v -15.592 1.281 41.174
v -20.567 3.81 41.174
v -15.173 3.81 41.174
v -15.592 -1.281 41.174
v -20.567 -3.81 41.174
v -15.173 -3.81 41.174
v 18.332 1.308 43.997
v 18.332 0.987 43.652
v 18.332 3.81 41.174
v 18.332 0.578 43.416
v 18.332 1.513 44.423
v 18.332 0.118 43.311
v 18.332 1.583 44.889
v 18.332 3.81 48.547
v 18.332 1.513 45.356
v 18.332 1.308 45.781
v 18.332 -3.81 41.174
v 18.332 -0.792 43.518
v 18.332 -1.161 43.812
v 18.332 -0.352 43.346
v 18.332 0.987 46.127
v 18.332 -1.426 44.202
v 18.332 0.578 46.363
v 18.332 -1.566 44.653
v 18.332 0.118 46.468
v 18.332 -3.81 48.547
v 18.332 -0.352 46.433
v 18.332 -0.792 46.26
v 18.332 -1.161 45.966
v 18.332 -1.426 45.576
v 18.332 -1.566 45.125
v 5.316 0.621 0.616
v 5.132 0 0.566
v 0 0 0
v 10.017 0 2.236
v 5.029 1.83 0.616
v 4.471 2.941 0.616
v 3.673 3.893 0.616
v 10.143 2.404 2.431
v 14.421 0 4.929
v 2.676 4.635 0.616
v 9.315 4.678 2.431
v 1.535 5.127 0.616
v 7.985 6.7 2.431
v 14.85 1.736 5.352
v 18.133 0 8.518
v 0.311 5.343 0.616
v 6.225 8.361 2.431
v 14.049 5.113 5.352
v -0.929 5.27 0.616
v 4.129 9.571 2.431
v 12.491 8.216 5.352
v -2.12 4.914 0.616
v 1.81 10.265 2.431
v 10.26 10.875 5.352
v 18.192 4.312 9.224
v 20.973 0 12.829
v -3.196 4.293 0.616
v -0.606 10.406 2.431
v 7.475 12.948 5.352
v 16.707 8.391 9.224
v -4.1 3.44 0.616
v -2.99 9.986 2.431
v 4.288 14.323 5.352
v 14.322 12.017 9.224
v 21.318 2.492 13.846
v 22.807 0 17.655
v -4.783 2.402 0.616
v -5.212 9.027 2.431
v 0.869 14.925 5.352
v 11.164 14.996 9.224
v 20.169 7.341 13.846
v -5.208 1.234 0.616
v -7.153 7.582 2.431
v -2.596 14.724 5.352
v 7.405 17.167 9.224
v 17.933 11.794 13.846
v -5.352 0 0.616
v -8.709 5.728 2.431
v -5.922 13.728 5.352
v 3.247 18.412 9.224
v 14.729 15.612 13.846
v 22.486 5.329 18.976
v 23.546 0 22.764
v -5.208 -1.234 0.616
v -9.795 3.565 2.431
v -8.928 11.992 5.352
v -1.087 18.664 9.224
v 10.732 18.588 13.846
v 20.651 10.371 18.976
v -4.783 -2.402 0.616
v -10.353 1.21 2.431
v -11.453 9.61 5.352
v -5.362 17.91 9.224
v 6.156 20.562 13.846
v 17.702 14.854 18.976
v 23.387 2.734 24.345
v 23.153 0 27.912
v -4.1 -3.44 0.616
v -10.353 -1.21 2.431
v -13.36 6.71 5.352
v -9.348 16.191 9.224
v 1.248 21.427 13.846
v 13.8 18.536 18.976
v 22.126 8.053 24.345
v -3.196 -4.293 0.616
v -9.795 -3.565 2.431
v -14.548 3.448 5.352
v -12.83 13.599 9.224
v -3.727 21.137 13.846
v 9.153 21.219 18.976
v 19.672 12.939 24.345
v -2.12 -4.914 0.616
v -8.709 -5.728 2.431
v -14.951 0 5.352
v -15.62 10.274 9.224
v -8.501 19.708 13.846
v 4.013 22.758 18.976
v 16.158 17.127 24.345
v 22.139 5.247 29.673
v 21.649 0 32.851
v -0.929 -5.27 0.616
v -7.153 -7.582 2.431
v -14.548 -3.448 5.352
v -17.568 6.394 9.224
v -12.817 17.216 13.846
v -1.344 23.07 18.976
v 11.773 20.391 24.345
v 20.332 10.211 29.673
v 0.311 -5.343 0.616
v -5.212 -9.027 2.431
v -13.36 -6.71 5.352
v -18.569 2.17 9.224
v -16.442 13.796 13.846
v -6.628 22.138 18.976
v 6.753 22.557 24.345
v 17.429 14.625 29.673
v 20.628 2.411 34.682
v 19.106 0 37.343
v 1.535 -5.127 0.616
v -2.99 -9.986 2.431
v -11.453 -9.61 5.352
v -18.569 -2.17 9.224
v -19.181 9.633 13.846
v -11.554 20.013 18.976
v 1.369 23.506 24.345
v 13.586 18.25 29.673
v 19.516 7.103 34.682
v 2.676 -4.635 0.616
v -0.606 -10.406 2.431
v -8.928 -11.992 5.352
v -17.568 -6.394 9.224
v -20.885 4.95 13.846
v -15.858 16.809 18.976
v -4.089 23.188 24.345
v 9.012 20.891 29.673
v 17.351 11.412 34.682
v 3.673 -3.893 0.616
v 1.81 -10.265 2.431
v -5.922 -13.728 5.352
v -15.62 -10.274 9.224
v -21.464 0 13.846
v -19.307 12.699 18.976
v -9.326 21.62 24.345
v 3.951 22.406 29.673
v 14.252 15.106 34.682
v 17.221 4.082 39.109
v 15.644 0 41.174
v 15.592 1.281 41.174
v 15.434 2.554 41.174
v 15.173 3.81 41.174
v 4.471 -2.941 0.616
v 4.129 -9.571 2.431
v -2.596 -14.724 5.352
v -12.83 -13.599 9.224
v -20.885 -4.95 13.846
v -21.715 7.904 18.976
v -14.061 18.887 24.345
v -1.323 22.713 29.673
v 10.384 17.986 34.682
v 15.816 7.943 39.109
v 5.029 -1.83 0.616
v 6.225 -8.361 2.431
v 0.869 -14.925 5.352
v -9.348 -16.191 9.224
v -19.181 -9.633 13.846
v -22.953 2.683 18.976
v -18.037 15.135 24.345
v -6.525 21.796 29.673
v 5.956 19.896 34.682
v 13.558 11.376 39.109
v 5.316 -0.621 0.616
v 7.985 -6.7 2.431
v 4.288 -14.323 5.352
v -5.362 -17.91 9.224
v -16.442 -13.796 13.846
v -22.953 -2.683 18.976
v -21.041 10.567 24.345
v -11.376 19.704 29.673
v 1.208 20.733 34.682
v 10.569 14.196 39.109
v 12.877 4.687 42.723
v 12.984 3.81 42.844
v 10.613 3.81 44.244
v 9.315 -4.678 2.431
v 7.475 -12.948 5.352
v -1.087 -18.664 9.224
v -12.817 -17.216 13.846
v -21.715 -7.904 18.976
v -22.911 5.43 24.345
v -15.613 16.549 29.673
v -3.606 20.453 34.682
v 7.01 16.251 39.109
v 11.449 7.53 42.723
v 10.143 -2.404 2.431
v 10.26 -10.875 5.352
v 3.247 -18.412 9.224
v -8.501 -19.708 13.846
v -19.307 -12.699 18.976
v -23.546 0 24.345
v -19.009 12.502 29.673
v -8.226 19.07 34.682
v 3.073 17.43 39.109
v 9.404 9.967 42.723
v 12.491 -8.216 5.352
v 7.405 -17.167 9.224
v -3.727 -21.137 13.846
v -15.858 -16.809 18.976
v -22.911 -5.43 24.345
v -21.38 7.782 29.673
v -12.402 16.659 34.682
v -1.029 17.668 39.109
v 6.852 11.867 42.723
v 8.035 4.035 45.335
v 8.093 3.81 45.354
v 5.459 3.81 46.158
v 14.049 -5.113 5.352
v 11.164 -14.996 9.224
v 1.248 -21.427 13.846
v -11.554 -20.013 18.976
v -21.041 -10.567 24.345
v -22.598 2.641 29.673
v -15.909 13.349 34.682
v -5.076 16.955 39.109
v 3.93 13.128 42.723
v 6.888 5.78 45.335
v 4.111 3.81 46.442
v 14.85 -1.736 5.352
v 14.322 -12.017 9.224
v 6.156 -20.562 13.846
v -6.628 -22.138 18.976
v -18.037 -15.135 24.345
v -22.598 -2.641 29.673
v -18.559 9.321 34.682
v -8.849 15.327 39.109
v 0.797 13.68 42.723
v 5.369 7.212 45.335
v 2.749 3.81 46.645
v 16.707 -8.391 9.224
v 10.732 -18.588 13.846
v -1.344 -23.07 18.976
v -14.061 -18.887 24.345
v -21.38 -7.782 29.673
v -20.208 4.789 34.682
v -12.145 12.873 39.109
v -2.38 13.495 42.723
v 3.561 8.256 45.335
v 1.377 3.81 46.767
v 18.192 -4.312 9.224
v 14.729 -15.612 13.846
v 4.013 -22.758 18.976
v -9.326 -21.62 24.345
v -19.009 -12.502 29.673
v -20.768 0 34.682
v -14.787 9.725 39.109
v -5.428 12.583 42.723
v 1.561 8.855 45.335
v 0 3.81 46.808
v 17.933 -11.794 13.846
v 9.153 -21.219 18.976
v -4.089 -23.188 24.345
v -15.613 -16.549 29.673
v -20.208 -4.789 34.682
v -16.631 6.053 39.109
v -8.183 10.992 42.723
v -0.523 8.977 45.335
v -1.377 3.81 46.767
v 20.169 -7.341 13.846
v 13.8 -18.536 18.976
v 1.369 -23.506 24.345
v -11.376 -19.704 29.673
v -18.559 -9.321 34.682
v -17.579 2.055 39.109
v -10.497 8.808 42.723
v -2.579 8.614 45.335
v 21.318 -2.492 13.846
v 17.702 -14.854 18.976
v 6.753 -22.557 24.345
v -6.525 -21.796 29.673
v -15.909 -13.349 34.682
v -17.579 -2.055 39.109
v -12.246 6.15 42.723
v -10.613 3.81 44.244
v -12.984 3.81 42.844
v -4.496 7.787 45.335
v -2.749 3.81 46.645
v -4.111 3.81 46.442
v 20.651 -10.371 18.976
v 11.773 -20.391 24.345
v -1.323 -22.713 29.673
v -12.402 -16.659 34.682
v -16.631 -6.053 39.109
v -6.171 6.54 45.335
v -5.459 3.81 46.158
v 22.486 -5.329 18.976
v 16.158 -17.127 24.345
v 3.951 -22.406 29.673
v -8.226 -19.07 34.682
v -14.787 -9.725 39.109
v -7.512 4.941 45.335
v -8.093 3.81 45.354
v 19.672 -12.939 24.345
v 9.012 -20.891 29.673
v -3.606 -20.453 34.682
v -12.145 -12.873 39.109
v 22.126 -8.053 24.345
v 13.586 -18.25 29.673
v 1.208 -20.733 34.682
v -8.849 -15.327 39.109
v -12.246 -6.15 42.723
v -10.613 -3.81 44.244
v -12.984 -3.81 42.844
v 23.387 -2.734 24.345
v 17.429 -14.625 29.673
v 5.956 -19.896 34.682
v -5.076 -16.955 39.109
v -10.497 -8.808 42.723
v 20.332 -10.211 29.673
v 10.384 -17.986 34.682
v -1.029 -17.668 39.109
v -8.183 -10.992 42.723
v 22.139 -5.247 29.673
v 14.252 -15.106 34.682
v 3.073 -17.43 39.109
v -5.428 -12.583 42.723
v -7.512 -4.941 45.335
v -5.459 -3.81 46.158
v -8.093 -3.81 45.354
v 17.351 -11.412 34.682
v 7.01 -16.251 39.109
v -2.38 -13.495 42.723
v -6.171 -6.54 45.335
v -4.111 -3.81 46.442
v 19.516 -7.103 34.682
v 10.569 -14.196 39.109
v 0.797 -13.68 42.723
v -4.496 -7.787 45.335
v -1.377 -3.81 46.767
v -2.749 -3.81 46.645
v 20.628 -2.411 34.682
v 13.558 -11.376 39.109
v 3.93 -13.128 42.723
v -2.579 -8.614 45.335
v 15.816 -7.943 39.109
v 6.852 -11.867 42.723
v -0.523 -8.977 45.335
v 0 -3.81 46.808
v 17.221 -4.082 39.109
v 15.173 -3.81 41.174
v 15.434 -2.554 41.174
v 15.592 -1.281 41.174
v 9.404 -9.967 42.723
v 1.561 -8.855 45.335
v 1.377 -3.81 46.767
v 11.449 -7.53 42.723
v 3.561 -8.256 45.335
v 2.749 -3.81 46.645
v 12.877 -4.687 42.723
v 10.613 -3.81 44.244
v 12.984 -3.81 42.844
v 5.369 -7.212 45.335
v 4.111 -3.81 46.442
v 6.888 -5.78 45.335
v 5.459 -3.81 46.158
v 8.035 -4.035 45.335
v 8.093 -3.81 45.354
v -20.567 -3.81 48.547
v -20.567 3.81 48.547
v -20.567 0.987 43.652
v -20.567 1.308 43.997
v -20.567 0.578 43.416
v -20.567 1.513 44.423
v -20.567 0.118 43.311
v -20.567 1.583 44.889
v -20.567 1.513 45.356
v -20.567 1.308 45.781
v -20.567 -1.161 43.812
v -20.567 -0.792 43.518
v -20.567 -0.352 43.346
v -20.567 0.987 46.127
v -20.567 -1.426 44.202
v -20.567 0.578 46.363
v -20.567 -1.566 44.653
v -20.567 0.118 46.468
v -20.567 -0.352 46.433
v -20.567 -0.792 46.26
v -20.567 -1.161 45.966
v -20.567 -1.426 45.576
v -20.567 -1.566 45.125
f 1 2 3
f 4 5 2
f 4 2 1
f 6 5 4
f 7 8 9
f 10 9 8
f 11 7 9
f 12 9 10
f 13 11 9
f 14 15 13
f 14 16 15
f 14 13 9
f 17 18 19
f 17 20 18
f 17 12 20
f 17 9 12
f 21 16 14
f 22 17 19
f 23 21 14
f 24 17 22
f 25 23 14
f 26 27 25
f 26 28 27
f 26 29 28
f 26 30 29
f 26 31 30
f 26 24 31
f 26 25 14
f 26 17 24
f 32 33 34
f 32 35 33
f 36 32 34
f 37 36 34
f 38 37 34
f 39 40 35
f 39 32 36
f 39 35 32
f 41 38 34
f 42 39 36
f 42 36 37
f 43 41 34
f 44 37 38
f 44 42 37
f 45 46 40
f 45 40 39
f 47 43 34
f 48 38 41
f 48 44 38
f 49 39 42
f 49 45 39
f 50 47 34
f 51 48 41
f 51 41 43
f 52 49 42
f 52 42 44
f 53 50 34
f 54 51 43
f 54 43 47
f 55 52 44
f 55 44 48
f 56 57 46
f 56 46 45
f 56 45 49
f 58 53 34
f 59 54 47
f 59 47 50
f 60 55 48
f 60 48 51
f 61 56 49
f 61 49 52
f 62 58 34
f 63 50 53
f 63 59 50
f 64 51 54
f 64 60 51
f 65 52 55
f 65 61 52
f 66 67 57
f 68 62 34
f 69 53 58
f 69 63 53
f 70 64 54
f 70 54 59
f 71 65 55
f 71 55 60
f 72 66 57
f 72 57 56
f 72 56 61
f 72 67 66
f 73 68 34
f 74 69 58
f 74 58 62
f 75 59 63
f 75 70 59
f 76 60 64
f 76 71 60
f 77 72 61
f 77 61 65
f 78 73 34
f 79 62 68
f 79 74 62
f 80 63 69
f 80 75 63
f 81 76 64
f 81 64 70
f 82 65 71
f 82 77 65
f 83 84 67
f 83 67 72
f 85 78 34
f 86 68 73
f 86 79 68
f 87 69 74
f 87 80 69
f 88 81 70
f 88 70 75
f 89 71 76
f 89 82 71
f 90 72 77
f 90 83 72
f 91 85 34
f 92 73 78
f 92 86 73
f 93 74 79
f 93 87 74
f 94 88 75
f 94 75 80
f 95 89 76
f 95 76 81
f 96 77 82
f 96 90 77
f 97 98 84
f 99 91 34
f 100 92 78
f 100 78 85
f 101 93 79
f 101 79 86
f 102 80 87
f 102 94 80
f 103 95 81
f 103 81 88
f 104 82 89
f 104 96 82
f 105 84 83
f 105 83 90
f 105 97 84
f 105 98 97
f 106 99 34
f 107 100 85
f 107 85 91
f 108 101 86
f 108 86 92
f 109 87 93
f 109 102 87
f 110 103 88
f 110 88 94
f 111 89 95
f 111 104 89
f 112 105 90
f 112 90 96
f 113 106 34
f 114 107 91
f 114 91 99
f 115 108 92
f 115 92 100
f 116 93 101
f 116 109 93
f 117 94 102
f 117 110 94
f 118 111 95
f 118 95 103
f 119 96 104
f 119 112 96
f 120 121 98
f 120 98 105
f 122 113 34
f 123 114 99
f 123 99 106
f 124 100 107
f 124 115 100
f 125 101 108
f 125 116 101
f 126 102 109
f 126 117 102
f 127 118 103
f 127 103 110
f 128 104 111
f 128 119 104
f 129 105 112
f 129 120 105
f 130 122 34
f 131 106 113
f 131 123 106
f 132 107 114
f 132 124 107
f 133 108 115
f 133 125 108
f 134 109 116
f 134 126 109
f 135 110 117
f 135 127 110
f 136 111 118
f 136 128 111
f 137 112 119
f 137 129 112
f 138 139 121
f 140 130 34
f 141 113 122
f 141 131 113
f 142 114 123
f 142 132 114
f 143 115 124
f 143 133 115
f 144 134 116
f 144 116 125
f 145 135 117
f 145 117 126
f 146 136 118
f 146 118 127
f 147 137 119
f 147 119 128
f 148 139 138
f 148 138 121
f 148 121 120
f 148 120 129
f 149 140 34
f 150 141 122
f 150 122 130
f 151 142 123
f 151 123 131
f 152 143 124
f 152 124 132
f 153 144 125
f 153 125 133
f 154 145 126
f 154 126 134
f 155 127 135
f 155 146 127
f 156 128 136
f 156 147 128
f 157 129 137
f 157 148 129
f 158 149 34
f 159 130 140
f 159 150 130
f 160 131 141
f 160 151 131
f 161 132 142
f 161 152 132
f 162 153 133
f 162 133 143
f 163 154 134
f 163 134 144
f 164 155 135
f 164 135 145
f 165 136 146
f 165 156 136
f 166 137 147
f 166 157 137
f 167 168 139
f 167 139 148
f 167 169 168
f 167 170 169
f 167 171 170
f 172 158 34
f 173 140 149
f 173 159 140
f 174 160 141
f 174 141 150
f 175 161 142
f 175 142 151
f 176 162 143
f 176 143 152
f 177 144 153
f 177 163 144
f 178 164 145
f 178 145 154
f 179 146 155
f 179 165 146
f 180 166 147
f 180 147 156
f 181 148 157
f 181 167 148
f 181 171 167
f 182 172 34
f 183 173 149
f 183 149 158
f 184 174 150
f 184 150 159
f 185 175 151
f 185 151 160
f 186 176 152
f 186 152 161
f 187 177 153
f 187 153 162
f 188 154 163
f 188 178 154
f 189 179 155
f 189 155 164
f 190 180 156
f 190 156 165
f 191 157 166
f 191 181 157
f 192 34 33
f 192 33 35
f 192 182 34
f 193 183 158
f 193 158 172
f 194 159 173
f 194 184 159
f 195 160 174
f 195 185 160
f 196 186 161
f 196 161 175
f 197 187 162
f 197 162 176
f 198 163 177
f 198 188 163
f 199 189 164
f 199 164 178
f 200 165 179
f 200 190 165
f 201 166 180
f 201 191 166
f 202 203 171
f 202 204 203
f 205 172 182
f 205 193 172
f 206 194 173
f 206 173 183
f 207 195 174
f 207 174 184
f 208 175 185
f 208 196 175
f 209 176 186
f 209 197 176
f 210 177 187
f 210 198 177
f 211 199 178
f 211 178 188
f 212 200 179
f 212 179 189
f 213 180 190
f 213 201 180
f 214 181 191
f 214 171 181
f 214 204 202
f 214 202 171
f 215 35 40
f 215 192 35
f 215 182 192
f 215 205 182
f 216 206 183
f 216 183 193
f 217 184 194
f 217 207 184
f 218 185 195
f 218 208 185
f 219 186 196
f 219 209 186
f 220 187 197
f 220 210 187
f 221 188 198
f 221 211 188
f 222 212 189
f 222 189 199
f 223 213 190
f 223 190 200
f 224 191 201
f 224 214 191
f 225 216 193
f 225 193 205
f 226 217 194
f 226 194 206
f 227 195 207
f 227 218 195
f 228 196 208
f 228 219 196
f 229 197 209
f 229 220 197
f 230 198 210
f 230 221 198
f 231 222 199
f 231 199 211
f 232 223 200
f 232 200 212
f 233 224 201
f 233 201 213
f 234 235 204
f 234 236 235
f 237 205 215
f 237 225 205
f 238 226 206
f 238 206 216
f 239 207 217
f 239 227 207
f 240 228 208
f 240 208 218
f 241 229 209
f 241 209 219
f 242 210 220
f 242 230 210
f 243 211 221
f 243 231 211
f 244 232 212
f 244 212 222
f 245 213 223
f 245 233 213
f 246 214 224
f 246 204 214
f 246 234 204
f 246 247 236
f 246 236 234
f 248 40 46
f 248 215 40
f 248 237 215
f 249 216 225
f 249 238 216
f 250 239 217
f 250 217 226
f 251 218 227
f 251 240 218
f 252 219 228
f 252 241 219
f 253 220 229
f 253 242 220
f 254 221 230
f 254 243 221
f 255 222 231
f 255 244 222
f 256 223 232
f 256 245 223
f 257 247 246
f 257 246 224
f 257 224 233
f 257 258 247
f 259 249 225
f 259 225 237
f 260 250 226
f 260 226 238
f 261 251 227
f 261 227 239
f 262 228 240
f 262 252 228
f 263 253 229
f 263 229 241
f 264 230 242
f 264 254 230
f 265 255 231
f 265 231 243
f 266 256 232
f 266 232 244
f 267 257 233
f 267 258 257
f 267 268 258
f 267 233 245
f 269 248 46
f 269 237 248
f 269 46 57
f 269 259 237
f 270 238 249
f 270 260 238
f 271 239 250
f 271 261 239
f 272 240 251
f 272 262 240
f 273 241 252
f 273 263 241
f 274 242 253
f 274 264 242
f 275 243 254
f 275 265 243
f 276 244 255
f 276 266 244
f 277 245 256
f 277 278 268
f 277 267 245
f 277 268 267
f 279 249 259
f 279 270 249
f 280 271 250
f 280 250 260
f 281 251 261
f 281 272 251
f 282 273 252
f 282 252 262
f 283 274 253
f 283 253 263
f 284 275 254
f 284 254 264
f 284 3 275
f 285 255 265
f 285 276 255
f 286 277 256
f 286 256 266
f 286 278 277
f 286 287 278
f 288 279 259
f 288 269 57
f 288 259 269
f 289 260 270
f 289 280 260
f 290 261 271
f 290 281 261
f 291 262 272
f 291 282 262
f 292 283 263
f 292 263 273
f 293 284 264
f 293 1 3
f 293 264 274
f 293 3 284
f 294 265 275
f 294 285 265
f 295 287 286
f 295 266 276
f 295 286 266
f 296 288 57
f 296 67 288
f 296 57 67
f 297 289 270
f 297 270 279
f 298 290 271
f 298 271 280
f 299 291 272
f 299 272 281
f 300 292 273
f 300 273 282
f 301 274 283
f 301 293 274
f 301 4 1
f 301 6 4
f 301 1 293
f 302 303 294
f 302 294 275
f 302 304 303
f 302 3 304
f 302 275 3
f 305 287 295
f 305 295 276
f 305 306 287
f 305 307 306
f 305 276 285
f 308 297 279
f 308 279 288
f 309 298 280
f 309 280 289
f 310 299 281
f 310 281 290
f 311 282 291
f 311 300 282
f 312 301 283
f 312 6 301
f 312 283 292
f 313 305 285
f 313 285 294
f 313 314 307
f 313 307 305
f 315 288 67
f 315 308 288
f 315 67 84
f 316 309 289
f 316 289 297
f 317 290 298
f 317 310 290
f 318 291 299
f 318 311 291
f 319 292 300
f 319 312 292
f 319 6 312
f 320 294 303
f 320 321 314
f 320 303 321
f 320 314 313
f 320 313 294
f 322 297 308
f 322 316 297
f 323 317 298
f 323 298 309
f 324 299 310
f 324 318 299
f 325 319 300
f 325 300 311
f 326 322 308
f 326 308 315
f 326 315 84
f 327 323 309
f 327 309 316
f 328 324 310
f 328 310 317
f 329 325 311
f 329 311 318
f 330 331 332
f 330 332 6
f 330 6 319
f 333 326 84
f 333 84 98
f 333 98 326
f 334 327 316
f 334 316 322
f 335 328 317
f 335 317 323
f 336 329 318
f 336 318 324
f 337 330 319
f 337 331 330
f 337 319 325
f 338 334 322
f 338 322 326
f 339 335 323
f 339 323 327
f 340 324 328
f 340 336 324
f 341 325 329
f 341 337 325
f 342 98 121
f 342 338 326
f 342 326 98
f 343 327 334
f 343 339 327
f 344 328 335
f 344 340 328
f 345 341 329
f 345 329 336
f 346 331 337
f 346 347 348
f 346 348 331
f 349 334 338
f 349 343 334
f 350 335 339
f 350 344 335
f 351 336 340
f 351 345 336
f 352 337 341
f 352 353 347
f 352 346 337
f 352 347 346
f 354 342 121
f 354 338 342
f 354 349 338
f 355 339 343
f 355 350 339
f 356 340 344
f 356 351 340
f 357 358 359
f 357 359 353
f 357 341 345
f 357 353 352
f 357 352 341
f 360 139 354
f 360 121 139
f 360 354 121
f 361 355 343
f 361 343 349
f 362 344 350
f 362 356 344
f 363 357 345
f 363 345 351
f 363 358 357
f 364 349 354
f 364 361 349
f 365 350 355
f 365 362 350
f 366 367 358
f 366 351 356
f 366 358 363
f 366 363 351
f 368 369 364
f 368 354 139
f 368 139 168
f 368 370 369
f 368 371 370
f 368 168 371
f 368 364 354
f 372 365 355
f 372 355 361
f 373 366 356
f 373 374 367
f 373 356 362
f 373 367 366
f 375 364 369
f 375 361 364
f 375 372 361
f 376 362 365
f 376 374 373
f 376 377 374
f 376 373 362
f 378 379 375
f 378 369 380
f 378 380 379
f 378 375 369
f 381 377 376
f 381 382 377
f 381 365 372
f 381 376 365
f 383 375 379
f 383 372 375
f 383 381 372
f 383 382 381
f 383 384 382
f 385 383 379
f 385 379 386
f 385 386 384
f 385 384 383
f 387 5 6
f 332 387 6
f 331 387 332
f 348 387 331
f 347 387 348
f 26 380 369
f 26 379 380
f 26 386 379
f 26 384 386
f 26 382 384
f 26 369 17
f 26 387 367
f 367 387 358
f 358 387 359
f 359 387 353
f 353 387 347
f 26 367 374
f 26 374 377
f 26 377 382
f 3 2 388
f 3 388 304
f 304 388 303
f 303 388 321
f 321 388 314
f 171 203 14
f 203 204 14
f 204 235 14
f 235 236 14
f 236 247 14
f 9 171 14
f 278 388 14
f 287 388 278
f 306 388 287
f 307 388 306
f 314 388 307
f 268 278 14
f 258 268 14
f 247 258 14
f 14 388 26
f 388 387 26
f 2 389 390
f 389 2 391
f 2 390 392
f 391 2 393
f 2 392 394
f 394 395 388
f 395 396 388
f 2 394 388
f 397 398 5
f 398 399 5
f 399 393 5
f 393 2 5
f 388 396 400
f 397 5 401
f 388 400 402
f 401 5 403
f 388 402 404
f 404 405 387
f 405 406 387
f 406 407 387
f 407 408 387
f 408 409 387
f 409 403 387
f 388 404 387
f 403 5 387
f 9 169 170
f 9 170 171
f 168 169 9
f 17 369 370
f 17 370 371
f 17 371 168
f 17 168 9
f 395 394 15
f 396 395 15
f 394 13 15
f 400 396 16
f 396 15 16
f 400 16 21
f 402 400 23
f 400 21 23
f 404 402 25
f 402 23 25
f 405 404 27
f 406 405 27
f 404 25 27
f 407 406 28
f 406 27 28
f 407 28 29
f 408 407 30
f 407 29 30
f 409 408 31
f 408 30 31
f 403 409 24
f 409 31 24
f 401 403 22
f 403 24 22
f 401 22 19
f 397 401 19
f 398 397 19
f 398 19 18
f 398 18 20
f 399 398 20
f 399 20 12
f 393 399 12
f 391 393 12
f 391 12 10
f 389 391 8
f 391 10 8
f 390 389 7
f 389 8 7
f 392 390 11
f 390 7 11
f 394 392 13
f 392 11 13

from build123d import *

# Parameters (mm, degrees)
F2_W     = 38.898766
F2_H     = 7.372967
F3_DEPTH = 3.81
F4_R     = 1.58321
F5_DEPTH = 22.86


with BuildPart() as f1:
    # F0 (on Front) → F1 (revolve)
    with BuildSketch(Plane.XZ):
        with BuildLine():
            Line((0, 47.11812), (0, 0))
            ThreePointArc((0, 0), (23.55906, 23.55906), (0, 47.11812))
        make_face()
    revolve(axis=Axis((0, 0, 23.55906), (0, 0, 1)))

    # F2 (on Front) → F3 (join, symmetric)
    with BuildSketch(Plane.XZ):
        with Locations((-1.117459, 44.860396)):
            Rectangle(F2_W, F2_H)
    extrude(amount=F3_DEPTH, both=True)

    # F4 (on Right) → F5 (cut, symmetric)
    with BuildSketch(Plane.YZ):
        with Locations((0, 44.889353)):
            Circle(F4_R)
    extrude(amount=F5_DEPTH, both=True, mode=Mode.SUBTRACT)


solid = f1.part
